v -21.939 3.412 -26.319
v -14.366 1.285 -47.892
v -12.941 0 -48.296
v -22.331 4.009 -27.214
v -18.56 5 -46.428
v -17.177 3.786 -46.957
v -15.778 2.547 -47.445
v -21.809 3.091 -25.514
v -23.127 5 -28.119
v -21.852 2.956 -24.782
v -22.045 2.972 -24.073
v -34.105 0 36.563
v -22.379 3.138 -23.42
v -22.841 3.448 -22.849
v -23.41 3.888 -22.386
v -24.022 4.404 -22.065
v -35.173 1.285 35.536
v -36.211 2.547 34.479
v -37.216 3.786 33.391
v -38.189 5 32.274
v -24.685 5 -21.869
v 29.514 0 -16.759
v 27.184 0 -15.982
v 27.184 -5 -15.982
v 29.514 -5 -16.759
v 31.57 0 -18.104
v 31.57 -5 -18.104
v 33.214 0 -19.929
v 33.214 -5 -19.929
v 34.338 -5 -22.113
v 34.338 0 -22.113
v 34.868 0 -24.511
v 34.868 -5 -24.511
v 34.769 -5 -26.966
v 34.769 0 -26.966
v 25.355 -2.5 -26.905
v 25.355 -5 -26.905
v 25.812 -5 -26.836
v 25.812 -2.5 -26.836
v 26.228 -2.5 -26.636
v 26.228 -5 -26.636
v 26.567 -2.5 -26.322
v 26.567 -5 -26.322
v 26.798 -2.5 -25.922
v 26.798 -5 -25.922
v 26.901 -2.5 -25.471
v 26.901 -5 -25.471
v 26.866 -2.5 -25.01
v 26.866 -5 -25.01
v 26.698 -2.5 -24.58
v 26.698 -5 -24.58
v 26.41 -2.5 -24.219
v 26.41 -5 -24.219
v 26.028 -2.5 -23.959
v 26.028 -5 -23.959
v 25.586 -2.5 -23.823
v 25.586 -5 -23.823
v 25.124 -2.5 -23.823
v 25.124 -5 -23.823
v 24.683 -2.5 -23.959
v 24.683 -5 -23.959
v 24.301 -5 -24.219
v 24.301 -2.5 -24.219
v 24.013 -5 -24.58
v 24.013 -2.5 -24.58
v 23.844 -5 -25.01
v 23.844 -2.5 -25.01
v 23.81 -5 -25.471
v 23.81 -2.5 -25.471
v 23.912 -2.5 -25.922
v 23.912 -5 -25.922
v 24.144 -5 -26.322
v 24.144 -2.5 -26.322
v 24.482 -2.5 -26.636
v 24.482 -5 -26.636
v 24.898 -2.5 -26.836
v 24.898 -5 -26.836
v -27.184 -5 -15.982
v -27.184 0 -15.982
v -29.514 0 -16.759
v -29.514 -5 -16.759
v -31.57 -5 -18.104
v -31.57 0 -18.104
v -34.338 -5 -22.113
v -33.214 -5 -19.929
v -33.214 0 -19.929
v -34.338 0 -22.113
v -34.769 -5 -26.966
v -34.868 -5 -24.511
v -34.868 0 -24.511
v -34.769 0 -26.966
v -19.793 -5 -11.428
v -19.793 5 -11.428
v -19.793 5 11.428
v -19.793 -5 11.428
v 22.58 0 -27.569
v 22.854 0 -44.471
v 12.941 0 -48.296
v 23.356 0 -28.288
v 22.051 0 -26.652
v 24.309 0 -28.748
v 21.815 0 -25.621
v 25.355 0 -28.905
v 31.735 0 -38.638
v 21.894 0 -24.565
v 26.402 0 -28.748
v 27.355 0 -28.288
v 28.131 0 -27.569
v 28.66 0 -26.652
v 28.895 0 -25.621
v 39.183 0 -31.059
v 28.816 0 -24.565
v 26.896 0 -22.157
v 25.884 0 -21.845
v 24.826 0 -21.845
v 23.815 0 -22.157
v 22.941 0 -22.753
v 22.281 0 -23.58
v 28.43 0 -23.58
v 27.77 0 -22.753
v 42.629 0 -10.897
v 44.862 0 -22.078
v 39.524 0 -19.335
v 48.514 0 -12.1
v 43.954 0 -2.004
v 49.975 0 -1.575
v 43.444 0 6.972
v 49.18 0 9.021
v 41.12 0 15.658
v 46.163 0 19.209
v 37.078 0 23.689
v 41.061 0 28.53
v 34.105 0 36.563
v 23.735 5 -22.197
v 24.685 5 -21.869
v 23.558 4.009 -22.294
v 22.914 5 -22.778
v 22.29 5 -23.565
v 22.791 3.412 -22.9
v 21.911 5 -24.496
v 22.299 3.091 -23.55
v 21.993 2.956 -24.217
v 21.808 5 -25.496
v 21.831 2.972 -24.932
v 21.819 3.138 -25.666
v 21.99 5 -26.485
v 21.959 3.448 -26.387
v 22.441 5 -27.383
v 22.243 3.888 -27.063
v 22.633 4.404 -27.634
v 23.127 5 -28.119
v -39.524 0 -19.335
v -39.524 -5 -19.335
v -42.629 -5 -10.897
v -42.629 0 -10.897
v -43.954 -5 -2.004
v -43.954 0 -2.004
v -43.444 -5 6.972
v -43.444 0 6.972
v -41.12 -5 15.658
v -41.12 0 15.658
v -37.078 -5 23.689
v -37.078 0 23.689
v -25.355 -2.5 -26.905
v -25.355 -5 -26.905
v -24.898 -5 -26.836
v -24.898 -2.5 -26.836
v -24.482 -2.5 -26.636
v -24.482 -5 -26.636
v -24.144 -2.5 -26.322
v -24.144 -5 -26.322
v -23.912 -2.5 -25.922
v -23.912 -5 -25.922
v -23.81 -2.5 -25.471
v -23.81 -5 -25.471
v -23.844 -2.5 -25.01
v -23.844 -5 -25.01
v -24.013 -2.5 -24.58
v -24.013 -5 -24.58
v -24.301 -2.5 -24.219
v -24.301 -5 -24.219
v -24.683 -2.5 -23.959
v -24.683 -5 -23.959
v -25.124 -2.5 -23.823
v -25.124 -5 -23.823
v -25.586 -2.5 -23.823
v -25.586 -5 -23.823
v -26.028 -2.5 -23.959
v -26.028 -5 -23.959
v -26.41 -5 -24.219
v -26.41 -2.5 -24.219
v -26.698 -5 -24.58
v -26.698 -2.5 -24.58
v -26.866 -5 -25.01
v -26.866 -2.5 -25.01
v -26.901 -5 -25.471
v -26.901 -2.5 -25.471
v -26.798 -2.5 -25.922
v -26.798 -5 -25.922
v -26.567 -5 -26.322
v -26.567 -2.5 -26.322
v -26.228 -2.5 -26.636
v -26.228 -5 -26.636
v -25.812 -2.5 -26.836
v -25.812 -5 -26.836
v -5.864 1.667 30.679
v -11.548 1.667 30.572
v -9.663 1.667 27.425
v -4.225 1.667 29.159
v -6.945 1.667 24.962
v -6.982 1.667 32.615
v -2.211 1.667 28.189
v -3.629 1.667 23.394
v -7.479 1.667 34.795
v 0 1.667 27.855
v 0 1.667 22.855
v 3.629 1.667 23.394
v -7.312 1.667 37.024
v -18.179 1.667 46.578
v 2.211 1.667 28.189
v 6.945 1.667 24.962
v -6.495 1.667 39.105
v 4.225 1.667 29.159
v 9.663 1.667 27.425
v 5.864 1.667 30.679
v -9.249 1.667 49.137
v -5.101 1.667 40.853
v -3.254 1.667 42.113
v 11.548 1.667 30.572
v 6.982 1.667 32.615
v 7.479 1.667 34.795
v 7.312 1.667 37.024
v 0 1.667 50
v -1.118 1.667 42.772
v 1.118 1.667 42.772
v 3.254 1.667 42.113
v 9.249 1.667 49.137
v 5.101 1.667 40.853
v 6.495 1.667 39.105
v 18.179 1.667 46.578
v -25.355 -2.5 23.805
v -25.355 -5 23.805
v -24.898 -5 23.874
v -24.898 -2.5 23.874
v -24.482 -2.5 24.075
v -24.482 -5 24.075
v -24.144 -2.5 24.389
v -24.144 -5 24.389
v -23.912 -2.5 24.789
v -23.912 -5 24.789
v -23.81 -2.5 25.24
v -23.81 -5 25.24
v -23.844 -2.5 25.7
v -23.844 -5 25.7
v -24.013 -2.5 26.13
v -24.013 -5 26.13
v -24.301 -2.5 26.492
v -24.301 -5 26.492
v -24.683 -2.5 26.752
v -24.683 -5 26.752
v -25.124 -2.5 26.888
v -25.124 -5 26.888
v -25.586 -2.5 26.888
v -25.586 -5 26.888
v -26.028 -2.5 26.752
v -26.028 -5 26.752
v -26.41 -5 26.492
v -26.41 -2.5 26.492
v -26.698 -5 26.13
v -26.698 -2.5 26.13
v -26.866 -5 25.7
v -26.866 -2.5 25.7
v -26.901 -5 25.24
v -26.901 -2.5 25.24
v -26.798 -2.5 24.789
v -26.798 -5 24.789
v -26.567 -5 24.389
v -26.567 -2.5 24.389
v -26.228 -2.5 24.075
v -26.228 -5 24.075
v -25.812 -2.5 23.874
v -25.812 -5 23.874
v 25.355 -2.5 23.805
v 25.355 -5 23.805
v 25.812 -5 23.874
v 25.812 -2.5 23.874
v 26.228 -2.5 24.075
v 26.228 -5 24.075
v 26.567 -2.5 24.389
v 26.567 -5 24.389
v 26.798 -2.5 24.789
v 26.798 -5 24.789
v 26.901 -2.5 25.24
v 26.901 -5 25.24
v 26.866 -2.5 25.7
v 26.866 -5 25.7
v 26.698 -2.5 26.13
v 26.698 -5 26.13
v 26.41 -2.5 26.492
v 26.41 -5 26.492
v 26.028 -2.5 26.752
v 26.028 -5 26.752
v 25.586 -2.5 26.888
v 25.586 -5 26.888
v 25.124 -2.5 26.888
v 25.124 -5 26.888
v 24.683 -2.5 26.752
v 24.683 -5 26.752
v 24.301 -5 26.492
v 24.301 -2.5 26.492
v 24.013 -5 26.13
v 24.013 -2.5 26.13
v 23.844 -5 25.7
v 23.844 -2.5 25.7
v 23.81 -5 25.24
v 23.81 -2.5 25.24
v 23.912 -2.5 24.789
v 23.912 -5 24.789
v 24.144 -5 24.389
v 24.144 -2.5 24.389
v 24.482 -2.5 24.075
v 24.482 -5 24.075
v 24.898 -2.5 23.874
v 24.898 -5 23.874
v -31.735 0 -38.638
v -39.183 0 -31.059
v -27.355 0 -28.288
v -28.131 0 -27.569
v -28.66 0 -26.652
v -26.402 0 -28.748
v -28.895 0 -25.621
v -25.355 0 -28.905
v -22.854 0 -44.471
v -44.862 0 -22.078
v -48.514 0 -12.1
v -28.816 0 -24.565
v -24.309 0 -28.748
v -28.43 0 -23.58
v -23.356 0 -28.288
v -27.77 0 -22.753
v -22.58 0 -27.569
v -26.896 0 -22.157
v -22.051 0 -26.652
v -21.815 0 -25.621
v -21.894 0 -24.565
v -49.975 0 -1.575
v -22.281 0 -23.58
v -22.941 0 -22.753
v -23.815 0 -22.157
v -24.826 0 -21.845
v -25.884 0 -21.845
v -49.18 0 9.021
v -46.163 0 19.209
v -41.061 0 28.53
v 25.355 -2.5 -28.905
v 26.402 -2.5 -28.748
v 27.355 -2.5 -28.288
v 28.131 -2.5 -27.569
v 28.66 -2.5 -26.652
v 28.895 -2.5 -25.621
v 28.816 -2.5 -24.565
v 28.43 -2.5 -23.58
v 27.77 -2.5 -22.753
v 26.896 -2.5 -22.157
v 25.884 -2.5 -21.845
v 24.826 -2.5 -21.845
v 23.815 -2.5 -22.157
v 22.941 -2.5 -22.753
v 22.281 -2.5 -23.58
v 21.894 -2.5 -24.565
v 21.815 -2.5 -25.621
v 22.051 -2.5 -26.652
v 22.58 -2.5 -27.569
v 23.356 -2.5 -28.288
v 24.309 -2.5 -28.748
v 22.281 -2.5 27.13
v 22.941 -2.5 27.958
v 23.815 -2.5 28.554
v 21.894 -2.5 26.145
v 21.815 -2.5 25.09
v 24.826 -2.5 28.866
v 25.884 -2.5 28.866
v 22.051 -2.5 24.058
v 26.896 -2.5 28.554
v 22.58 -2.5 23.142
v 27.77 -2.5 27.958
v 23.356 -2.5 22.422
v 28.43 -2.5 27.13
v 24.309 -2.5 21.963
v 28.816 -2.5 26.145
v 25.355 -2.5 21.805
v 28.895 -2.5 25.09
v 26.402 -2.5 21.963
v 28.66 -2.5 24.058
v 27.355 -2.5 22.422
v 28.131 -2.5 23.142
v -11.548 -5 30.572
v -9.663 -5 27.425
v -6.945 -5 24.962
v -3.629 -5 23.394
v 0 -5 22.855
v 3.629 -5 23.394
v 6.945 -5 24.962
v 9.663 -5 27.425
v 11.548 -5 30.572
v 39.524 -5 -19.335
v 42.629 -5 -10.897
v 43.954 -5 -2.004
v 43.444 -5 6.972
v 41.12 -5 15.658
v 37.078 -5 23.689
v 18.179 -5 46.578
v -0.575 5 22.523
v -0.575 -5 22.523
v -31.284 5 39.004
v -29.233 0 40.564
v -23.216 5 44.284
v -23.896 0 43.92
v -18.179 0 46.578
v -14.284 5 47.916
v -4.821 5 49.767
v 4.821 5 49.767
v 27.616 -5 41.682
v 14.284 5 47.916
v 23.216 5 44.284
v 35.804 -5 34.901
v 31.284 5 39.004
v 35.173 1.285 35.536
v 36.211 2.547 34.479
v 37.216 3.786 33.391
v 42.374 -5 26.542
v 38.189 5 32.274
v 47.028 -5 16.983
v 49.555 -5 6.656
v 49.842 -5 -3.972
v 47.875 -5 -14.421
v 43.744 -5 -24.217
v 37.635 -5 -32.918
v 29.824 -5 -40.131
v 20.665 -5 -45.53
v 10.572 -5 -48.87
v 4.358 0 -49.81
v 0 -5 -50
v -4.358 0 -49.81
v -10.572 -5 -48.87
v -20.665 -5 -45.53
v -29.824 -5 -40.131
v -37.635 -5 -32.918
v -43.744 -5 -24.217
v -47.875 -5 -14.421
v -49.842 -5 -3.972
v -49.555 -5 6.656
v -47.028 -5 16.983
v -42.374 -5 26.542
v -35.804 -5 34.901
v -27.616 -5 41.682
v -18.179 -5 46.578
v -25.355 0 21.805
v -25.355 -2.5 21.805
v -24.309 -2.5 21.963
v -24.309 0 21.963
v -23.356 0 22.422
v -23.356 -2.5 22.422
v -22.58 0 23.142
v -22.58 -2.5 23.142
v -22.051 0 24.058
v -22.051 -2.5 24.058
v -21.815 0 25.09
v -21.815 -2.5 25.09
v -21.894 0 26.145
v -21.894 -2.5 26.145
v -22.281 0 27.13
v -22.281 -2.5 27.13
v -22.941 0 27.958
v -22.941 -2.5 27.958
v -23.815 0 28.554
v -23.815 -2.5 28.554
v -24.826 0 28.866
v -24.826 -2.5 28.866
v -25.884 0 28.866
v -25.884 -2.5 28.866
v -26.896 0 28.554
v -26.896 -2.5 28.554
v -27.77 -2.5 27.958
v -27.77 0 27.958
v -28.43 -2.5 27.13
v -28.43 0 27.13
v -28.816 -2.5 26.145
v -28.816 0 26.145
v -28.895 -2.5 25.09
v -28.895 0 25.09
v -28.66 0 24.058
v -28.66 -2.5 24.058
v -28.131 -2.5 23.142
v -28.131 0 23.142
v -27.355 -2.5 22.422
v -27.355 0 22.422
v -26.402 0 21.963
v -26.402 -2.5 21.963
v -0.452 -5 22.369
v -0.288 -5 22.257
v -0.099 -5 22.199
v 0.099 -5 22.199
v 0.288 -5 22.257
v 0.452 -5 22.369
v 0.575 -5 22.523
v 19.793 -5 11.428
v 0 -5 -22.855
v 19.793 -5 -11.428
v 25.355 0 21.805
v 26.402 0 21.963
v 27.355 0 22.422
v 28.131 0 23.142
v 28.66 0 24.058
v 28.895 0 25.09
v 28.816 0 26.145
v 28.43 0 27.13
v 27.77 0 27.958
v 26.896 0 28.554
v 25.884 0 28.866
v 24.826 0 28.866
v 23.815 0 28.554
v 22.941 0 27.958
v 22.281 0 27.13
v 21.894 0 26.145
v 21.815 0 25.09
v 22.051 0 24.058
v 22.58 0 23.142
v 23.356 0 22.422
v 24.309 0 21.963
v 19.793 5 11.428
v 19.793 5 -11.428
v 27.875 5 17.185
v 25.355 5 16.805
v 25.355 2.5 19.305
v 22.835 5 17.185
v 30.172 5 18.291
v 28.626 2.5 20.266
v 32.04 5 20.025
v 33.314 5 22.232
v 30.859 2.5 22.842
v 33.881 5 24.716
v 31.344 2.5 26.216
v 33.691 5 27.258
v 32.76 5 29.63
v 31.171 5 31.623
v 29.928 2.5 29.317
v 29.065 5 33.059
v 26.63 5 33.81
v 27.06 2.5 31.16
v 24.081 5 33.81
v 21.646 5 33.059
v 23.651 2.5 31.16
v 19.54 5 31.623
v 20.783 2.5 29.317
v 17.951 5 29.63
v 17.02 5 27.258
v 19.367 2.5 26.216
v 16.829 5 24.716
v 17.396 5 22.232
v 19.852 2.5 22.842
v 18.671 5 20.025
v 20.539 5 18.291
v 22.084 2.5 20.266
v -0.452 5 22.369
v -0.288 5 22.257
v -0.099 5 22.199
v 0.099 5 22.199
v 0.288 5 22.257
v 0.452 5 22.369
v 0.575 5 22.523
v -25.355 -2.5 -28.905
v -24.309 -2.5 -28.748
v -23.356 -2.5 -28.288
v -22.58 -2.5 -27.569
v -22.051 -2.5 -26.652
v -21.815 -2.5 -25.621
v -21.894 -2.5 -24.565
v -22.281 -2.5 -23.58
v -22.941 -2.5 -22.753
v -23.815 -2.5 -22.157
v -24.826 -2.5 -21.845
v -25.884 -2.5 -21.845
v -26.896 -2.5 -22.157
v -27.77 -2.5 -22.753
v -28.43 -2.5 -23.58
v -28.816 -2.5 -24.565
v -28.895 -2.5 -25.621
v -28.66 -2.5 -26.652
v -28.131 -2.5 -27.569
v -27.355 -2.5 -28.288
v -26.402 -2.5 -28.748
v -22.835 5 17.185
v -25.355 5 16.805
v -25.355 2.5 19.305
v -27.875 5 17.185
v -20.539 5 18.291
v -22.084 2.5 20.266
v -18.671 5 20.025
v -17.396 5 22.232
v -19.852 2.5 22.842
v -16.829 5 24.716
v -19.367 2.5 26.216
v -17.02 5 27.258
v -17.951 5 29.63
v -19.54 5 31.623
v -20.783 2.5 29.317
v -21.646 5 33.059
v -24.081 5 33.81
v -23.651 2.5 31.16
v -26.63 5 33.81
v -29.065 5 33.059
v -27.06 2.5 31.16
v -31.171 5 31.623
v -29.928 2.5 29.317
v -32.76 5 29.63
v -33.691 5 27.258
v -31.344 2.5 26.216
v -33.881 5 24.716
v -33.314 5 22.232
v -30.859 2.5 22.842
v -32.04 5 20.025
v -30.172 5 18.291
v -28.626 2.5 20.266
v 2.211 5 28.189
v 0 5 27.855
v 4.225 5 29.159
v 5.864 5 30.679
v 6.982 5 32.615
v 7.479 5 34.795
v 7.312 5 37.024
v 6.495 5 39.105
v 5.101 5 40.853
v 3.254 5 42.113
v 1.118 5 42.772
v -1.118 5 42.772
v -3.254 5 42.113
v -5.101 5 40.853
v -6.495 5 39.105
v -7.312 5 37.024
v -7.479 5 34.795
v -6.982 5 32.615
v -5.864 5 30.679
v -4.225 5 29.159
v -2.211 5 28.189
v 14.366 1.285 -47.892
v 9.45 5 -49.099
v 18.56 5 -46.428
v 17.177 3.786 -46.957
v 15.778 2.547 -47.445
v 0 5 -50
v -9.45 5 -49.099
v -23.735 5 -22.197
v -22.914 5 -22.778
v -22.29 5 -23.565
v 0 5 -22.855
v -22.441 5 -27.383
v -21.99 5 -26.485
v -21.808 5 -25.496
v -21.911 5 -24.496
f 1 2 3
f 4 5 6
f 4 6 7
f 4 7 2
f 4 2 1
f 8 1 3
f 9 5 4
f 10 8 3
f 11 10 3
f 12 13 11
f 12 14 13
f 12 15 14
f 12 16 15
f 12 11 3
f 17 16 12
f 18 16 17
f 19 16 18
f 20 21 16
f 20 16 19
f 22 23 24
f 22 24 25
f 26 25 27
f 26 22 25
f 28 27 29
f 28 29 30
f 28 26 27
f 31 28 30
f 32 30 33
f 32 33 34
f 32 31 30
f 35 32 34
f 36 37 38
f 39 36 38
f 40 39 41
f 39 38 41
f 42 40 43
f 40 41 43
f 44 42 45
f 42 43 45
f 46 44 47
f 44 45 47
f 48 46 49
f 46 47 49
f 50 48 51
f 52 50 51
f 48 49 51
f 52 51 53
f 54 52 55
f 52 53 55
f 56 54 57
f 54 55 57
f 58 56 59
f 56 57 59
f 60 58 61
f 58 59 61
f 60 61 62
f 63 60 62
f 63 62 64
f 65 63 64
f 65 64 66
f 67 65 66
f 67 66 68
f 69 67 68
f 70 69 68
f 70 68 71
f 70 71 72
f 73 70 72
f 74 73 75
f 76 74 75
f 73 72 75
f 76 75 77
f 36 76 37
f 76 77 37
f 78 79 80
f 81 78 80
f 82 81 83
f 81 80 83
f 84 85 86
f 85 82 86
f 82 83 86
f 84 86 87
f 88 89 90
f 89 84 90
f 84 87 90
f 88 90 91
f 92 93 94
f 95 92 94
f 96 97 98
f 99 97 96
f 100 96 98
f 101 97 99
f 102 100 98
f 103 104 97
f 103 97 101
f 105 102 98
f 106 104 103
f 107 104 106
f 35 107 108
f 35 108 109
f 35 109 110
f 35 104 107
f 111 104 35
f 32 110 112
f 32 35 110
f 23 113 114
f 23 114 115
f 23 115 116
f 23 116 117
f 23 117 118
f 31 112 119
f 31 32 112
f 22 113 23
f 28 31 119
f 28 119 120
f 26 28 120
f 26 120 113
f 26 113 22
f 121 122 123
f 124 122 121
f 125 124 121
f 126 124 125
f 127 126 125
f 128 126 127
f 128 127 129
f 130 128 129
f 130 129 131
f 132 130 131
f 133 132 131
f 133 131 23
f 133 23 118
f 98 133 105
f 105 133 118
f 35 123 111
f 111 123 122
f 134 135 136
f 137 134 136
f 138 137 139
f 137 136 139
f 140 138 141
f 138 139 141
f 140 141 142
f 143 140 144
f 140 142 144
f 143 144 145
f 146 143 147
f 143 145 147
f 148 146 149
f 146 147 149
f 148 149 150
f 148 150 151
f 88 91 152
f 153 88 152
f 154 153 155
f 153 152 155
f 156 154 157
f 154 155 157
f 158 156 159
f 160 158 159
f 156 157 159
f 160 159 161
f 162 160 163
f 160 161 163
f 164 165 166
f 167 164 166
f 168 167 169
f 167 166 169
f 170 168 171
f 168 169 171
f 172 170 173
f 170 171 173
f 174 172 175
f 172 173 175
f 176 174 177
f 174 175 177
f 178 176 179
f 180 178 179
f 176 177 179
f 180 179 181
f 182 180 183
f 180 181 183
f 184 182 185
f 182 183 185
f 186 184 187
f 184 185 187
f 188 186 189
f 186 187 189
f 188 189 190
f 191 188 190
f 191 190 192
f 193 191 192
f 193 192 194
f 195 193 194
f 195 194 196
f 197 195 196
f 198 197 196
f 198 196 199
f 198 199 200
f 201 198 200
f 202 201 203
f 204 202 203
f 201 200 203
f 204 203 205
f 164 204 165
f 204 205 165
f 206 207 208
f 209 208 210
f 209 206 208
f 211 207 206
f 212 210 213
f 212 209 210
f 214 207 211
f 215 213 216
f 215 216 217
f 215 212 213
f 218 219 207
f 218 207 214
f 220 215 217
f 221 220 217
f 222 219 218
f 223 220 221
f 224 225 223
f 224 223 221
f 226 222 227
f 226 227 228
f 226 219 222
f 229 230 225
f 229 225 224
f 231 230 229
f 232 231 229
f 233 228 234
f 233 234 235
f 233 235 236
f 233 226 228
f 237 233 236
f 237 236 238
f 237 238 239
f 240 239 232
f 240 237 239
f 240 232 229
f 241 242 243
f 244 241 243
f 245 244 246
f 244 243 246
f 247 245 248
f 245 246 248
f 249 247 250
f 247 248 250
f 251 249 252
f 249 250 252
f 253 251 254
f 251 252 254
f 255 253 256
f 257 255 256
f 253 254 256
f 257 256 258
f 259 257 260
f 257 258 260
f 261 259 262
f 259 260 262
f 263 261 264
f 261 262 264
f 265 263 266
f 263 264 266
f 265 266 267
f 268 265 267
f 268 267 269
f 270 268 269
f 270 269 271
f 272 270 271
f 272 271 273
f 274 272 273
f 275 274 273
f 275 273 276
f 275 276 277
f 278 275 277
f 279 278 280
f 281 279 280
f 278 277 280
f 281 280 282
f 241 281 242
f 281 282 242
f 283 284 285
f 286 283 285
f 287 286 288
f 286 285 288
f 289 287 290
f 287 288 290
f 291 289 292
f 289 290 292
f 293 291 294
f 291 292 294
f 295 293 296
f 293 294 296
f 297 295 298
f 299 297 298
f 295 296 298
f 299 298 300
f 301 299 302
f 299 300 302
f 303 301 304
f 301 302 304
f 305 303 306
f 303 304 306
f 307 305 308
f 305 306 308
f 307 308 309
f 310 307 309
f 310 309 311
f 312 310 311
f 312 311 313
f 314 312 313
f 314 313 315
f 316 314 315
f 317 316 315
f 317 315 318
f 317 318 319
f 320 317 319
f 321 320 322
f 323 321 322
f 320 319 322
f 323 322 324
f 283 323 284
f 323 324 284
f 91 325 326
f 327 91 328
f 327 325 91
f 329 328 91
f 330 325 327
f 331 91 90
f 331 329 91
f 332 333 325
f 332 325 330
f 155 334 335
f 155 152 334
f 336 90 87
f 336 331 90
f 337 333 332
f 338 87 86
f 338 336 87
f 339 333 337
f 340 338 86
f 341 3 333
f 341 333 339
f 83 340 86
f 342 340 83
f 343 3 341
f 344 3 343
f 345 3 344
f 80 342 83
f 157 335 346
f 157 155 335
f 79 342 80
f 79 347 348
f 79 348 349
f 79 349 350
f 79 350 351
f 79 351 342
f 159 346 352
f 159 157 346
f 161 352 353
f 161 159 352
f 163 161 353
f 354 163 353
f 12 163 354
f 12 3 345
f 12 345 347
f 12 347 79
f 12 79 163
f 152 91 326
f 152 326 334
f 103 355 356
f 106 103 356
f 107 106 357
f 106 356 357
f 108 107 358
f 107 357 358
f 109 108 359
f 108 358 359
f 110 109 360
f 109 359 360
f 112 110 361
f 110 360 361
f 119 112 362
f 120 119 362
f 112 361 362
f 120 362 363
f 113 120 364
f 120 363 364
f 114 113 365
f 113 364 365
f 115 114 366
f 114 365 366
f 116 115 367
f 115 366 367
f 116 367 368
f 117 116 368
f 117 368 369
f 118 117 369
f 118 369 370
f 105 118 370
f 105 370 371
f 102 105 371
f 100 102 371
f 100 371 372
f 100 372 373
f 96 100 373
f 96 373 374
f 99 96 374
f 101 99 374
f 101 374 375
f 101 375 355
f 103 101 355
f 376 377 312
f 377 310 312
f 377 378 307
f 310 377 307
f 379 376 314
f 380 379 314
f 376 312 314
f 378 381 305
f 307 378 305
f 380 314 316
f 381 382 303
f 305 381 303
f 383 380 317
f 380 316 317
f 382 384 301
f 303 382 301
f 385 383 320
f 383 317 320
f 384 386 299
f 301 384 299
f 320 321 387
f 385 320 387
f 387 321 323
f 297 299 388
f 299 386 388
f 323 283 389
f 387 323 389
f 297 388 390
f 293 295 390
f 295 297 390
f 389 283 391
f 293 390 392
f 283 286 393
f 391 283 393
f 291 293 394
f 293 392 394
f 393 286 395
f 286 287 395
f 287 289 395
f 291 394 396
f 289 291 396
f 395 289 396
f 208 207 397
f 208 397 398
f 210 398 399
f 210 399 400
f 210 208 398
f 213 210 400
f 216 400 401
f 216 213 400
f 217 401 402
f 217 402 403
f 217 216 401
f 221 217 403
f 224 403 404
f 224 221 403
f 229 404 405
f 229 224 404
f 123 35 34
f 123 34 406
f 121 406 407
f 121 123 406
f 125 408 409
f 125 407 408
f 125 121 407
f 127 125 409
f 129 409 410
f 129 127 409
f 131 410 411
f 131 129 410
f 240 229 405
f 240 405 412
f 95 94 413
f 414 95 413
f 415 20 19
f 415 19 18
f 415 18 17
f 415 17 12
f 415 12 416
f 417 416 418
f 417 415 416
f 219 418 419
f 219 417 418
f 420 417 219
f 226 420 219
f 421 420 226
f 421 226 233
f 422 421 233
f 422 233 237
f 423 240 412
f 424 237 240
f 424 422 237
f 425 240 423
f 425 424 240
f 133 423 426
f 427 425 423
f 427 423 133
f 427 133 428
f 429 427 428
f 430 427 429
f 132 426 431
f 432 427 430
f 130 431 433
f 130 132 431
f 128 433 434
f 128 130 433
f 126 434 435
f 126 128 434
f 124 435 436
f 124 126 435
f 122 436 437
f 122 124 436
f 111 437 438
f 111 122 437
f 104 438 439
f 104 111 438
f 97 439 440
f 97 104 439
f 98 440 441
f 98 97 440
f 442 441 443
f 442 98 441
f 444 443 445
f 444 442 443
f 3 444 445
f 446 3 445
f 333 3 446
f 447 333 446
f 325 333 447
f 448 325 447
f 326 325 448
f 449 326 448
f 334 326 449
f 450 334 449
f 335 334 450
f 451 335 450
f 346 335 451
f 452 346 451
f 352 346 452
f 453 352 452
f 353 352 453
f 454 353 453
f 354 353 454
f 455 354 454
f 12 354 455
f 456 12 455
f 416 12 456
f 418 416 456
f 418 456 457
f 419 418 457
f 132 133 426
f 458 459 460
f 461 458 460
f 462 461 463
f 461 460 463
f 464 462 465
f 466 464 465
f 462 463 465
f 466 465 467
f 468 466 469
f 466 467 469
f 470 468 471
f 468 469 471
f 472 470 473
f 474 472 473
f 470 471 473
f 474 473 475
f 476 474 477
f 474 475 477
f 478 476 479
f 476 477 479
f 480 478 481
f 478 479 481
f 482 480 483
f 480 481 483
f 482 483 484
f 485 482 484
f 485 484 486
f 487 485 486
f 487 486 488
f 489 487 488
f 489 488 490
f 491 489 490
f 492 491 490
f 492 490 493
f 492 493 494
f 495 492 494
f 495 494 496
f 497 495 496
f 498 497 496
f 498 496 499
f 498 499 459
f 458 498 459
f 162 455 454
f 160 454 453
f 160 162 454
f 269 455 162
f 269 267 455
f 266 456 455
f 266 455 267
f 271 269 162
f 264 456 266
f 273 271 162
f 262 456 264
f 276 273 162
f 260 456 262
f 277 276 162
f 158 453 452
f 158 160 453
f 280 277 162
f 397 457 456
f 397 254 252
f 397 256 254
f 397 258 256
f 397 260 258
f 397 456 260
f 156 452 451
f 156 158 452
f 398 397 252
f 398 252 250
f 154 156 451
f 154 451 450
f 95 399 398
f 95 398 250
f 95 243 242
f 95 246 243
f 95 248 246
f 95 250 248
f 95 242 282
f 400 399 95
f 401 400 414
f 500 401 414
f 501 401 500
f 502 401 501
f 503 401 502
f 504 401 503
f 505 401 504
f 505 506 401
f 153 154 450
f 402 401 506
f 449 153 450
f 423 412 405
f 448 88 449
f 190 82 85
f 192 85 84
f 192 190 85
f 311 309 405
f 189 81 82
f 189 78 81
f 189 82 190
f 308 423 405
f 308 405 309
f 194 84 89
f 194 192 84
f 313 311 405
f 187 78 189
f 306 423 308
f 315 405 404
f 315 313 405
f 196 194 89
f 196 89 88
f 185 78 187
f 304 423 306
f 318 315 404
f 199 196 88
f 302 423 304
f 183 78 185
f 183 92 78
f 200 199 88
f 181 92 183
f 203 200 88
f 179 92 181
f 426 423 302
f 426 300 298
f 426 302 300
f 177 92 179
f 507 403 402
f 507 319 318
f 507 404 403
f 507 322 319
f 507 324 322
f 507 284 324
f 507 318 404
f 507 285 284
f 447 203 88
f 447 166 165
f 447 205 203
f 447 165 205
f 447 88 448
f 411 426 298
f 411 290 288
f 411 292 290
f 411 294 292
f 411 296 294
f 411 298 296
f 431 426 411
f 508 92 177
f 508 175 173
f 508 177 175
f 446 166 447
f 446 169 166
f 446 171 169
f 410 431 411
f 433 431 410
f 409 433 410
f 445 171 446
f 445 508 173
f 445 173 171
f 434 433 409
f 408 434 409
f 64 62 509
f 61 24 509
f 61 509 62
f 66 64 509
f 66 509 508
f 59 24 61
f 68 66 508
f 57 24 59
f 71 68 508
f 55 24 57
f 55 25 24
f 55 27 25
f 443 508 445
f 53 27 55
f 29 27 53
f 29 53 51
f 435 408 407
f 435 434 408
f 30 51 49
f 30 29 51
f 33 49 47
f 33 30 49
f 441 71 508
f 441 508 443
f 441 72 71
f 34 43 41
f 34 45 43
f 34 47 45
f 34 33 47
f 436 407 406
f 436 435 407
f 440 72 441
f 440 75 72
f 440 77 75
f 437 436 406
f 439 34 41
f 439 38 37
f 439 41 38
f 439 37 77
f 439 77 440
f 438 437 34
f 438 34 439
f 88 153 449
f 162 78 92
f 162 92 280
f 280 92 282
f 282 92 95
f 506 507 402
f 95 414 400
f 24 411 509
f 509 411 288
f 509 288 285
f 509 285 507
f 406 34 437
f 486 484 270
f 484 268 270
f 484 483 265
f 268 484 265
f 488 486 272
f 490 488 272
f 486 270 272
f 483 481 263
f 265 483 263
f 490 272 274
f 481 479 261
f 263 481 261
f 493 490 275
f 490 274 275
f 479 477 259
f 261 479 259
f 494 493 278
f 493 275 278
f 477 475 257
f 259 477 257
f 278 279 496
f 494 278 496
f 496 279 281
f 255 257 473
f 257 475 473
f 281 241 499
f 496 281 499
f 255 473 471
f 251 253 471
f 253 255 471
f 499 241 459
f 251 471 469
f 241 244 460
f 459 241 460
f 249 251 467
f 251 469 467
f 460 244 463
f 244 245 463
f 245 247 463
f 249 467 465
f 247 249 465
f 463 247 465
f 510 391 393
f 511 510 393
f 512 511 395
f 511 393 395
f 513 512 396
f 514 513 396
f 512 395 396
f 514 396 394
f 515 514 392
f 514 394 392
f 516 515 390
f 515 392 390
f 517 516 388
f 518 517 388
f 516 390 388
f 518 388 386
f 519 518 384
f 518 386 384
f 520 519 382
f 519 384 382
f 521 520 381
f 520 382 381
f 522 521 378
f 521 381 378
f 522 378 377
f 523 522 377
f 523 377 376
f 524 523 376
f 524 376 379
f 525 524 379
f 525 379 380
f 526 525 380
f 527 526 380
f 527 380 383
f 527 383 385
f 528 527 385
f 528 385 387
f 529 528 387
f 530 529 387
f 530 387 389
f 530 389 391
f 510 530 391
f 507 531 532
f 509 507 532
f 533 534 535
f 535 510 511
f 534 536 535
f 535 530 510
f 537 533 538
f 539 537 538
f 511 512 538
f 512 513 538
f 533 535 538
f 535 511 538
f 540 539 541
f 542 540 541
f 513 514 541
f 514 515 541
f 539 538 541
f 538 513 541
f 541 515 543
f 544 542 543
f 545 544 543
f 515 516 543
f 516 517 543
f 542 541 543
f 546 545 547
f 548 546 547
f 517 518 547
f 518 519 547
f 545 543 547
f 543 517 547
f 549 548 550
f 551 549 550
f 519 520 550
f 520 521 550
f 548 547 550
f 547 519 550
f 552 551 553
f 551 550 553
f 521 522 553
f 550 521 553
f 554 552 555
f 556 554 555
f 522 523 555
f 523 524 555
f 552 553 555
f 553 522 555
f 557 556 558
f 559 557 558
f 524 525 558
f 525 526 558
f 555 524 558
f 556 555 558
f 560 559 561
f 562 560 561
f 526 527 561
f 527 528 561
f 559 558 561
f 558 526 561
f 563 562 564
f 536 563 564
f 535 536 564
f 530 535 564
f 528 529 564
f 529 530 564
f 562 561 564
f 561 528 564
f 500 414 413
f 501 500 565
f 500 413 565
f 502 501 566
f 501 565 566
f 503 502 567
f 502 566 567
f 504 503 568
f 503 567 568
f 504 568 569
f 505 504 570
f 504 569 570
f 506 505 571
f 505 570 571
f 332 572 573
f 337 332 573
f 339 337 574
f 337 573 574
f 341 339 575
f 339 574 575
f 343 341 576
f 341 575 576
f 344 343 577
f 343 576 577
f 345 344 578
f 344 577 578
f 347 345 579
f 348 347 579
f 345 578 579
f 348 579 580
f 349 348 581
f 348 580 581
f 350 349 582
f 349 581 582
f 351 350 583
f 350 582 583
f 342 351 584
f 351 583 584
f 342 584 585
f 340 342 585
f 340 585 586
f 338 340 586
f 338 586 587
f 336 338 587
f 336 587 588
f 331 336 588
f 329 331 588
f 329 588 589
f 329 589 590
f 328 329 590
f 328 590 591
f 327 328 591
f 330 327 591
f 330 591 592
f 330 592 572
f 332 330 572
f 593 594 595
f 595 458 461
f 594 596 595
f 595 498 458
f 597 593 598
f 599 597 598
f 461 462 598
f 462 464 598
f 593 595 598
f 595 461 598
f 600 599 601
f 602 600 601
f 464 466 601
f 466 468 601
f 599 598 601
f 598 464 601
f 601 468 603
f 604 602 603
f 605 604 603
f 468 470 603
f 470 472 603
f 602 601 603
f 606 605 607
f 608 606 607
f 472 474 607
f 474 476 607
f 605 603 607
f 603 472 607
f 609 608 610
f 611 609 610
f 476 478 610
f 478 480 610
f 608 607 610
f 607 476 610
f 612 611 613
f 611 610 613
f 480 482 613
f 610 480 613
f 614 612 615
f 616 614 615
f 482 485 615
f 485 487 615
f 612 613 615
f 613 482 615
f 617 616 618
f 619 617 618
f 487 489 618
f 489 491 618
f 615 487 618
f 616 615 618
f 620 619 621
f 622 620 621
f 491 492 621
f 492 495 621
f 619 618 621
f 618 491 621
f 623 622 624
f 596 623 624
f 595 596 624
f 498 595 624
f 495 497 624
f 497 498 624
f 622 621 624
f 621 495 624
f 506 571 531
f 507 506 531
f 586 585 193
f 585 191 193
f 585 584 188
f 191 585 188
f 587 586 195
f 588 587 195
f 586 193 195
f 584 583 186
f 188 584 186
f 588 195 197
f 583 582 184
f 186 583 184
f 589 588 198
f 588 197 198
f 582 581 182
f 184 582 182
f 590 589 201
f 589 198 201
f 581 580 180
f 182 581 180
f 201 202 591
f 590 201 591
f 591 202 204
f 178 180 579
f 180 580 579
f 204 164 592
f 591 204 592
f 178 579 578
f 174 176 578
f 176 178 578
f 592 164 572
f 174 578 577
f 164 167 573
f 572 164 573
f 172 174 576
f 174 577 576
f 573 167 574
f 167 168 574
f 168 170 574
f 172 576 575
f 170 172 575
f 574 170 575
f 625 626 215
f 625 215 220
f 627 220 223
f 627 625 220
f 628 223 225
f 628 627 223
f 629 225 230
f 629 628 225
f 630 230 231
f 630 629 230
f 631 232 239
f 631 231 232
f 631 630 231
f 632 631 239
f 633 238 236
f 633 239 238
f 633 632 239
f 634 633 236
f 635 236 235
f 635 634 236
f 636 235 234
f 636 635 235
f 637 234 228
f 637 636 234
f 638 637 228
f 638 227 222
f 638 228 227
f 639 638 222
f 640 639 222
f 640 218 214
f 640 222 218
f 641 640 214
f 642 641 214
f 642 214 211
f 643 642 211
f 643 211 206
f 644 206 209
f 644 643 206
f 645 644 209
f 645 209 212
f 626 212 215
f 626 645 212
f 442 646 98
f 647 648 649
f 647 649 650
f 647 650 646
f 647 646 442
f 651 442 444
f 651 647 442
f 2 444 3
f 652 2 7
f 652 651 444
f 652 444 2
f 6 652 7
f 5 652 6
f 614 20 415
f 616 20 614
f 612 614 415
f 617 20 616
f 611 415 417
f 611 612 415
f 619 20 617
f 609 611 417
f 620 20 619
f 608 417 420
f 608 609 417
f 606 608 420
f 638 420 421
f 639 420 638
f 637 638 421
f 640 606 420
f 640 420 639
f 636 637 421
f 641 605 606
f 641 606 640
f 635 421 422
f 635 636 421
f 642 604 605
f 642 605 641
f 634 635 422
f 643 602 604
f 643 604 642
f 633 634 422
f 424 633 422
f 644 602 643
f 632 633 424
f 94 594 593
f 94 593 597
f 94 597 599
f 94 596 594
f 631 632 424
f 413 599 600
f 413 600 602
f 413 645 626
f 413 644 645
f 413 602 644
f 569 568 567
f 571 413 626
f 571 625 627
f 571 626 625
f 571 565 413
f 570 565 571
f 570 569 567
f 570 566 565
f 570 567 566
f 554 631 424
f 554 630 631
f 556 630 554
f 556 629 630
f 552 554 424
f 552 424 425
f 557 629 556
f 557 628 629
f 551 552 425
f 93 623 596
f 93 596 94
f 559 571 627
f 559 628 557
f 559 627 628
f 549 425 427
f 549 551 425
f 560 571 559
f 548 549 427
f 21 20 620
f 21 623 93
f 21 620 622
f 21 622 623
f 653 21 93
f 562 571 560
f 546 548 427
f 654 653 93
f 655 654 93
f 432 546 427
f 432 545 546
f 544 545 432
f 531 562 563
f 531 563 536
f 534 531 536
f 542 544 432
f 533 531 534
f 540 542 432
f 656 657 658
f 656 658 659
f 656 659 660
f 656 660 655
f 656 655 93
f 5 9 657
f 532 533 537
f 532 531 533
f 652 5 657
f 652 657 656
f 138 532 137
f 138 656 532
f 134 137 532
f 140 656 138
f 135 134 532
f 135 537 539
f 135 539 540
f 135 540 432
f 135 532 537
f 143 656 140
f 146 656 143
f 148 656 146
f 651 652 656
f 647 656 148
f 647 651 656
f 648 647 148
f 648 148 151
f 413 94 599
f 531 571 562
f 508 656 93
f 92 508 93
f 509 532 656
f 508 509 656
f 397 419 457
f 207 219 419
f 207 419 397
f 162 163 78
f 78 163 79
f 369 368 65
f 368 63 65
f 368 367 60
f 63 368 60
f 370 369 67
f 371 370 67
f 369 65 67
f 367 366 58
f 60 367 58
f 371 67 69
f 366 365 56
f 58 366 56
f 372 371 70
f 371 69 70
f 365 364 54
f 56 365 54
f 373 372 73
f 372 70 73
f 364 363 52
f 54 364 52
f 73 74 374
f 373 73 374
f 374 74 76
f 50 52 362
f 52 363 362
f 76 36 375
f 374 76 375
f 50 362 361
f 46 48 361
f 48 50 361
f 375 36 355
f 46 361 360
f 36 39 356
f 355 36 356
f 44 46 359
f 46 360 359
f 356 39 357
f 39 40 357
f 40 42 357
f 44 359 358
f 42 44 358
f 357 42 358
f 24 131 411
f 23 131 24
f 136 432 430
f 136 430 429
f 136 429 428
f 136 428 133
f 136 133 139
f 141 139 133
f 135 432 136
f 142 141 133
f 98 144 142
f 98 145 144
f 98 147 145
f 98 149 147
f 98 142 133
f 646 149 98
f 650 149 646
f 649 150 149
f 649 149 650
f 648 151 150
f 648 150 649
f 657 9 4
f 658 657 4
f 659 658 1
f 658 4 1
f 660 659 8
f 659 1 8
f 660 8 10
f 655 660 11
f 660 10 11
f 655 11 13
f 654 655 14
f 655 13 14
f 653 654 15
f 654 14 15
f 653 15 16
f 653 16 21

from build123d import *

# Parameters (mm, degrees)
SKETCH1_R               = 50
BOSS_EXTRUDE1_DEPTH     = 5
BOSS_EXTRUDE3_START     = 5
BOSS_EXTRUDE3_DEPTH     = 5
DRAFT2_ANGLE            = -45
CUT_EXTRUDE3_DEPTH      = 72.414284285
CUT_EXTRUDE3_DEPTH_BACK = 72.414284285
SKETCH3_R               = 7.5
CUT_EXTRUDE5_START      = -6.666666667
CUT_EXTRUDE5_DEPTH      = 6.666666667
SKETCH5_R               = 3.55
SKETCH5_R_2             = 1.55
CUT_EXTRUDE6_DEPTH      = 72.414284285
SKETCH5_3_R             = 3.55
SKETCH5_3_R_2           = 1.55
BOSS_EXTRUDE4_DEPTH     = 2.5
CUT_EXTRUDE8_DEPTH      = 72.414284285
CHAMFER1_SIZE           = 5
CUT_EXTRUDE9_DEPTH      = 71.887234394


with BuildPart() as part:
    # Sketch1 → Boss-Extrude1 (new body)
    with BuildSketch(Plane(origin=(0, 0, 0), x_dir=(1, 0, 0), z_dir=(0, 1, 0))):
        with Locations(Location((0, 0, 0), (0, 0, 270))):
            Circle(SKETCH1_R)
    extrude(amount=-BOSS_EXTRUDE1_DEPTH)

    # Sketch1<6> → Boss-Extrude3 (add)
    with BuildSketch(Plane(origin=(0, 0, 0), x_dir=(1, 0, 0), z_dir=(0, 1, 0)).offset(BOSS_EXTRUDE3_START)):
        with BuildLine():
            Line((-12.940952256, 48.296291314), (-34.10533906, -36.562629112))
            ThreePointArc((-34.10533906, -36.562629112), (0, -50), (34.10533906, -36.562629112))
            Line((34.10533906, -36.562629112), (12.940952256, 48.296291314))
            ThreePointArc((12.940952256, 48.296291314), (0, 50), (-12.940952256, 48.296291314))
        make_face()
    extrude(amount=-BOSS_EXTRUDE3_DEPTH)

    # Draft2
    draft2_faces = [part.faces().sort_by_distance(p)[0] for p in [
        (23.523145658, 2.5, -5.866831101),
        (-23.523145658, 2.5, -5.866831101),
    ]]
    draft(draft2_faces, Plane.ZX, DRAFT2_ANGLE)

    # Sketch3 → Cut-Extrude3 (cut, two sides: drawn at the far end of the back side and taken through both)
    with BuildSketch(Plane.XZ.offset(5).offset(-CUT_EXTRUDE3_DEPTH_BACK)):
        with Locations(Location((0, 35.355339059, 0), (0, 0, 270))):
            Circle(SKETCH3_R)
    extrude(amount=CUT_EXTRUDE3_DEPTH + CUT_EXTRUDE3_DEPTH_BACK, mode=Mode.SUBTRACT)

    # Sketch4 → Cut-Extrude5 (cut)
    with BuildSketch(Plane.XZ.offset(5).offset(CUT_EXTRUDE5_START)):
        with BuildLine():
            ThreePointArc((18.178606224, 46.578302628), (0, 50), (-18.178606224, 46.578302628))
            Line((-18.178606224, 46.578302628), (-11.548494202, 30.571796264))
            ThreePointArc((-11.548494202, 30.571796264), (3.3e-08, 22.855339059), (11.548494227, 30.571796326))
            Line((11.548494227, 30.571796326), (18.178606224, 46.578302628))
        make_face()
    extrude(amount=CUT_EXTRUDE5_DEPTH, mode=Mode.SUBTRACT)

    # Sketch5 → Cut-Extrude6 (cut, through all)
    # profile 1 of 8: a face of its own
    with BuildSketch(Plane.XZ.offset(5)):
        with Locations(Location((25.355339059, 25.355339059, 0), (0, 0, 270))):
            Circle(SKETCH5_R)
        with Locations((25.355339059, 25.355339059)):
            Circle(SKETCH5_R_2, mode=Mode.SUBTRACT)
    # profile 2 of 8: a face of its own
    with BuildSketch(Plane.XZ.offset(5)):
        with Locations((25.355339059, 25.355339059)):
            Circle(SKETCH5_R_2)
    # profile 3 of 8: a face of its own
    with BuildSketch(Plane.XZ.offset(5)):
        with Locations(Location((25.355339059, -25.355339059, 0), (0, 0, 270))):
            Circle(SKETCH5_R)
        with Locations((25.355339059, -25.355339059)):
            Circle(SKETCH5_R_2, mode=Mode.SUBTRACT)
    # profile 4 of 8: a face of its own
    with BuildSketch(Plane.XZ.offset(5)):
        with Locations((25.355339059, -25.355339059)):
            Circle(SKETCH5_R_2)
    # profile 5 of 8: a face of its own
    with BuildSketch(Plane.XZ.offset(5)):
        with Locations(Location((-25.355339059, -25.355339059, 0), (0, 0, 270))):
            Circle(SKETCH5_R)
        with Locations((-25.355339059, -25.355339059)):
            Circle(SKETCH5_R_2, mode=Mode.SUBTRACT)
    # profile 6 of 8: a face of its own
    with BuildSketch(Plane.XZ.offset(5)):
        with Locations((-25.355339059, -25.355339059)):
            Circle(SKETCH5_R_2)
    # profile 7 of 8: a face of its own
    with BuildSketch(Plane.XZ.offset(5)):
        with Locations(Location((-25.355339059, 25.355339059, 0), (0, 0, 270))):
            Circle(SKETCH5_R)
        with Locations((-25.355339059, 25.355339059)):
            Circle(SKETCH5_R_2, mode=Mode.SUBTRACT)
    # profile 8 of 8: a face of its own
    with BuildSketch(Plane.XZ.offset(5)):
        with Locations((-25.355339059, 25.355339059)):
            Circle(SKETCH5_R_2)
    extrude(amount=-CUT_EXTRUDE6_DEPTH, mode=Mode.SUBTRACT)

    # Sketch5<3> → Boss-Extrude4 (add)
    # profile 1 of 4: a face of its own
    with BuildSketch(Plane.XZ.offset(5)):
        with Locations(Location((25.355339059, -25.355339059, 0), (0, 0, 270))):
            Circle(SKETCH5_3_R)
        with Locations(Location((25.355339059, -25.355339059, 0), (0, 0, 270))):
            Circle(SKETCH5_3_R_2, mode=Mode.SUBTRACT)
    # profile 2 of 4: a face of its own
    with BuildSketch(Plane.XZ.offset(5)):
        with Locations(Location((-25.355339059, -25.355339059, 0), (0, 0, 270))):
            Circle(SKETCH5_3_R)
        with Locations(Location((-25.355339059, -25.355339059, 0), (0, 0, 270))):
            Circle(SKETCH5_3_R_2, mode=Mode.SUBTRACT)
    # profile 3 of 4: a face of its own
    with BuildSketch(Plane.XZ.offset(5)):
        with Locations(Location((25.355339059, 25.355339059, 0), (0, 0, 270))):
            Circle(SKETCH5_3_R)
        with Locations(Location((25.355339059, 25.355339059, 0), (0, 0, 270))):
            Circle(SKETCH5_3_R_2, mode=Mode.SUBTRACT)
    # profile 4 of 4: a face of its own
    with BuildSketch(Plane.XZ.offset(5)):
        with Locations(Location((-25.355339059, 25.355339059, 0), (0, 0, 270))):
            Circle(SKETCH5_3_R)
        with Locations(Location((-25.355339059, 25.355339059, 0), (0, 0, 270))):
            Circle(SKETCH5_3_R_2, mode=Mode.SUBTRACT)
    extrude(amount=-BOSS_EXTRUDE4_DEPTH)

    # Sketch6 → Cut-Extrude8 (cut, through all)
    with BuildSketch(Plane(origin=(0, 5, 0), x_dir=(1, 0, 0), z_dir=(0, 1, 0))):
        with BuildLine():
            ThreePointArc((-0.574925376, -22.523405739), (0, -22.191472419), (0.574925376, -22.523405739))
            Line((0.574925376, -22.523405739), (19.793304237, -11.42766953))
            Line((19.793304237, -11.42766953), (19.793304237, 11.42766953))
            Line((19.793304237, 11.42766953), (0, 22.855339059))
            Line((0, 22.855339059), (-19.793304237, 11.42766953))
            Line((-19.793304237, 11.42766953), (-19.793304237, -11.42766953))
            Line((-19.793304237, -11.42766953), (-0.574925376, -22.523405739))
        make_face()
    extrude(amount=-CUT_EXTRUDE8_DEPTH, mode=Mode.SUBTRACT)

    # Chamfer1
    chamfer1_edges = [part.edges().sort_by_distance(p)[0] for p in [
        (-25.355339059, 5, 28.905339059),
        (25.355339059, 5, 28.905339059),
    ]]
    chamfer(chamfer1_edges, length=CHAMFER1_SIZE)

    # Sketch7 → Cut-Extrude9 (cut, symmetric)
    with BuildSketch(Plane(origin=(0, 0, 0), x_dir=(1, 0, 0), z_dir=(0, 1, 0))):
        with BuildLine():
            ThreePointArc((-34.768601784, 26.965613845), (-43.954325541, 2.004311919), (-37.078464111, -23.689396344))
            Line((-37.078464111, -23.689396344), (-27.184130942, 15.982078141))
            ThreePointArc((-27.184130942, 15.982078141), (-33.213803419, 19.928826559), (-34.768601784, 26.965613845))
        make_face()
    cut_extrude9 = extrude(amount=CUT_EXTRUDE9_DEPTH, both=True, mode=Mode.SUBTRACT)

    # Mirror1: Cut-Extrude9 across plane
    add(cut_extrude9.mirror(Plane(origin=(0, 0, 0), x_dir=(0, 0, 1), z_dir=(1, 0, 0))), mode=Mode.SUBTRACT)


solid = part.part
